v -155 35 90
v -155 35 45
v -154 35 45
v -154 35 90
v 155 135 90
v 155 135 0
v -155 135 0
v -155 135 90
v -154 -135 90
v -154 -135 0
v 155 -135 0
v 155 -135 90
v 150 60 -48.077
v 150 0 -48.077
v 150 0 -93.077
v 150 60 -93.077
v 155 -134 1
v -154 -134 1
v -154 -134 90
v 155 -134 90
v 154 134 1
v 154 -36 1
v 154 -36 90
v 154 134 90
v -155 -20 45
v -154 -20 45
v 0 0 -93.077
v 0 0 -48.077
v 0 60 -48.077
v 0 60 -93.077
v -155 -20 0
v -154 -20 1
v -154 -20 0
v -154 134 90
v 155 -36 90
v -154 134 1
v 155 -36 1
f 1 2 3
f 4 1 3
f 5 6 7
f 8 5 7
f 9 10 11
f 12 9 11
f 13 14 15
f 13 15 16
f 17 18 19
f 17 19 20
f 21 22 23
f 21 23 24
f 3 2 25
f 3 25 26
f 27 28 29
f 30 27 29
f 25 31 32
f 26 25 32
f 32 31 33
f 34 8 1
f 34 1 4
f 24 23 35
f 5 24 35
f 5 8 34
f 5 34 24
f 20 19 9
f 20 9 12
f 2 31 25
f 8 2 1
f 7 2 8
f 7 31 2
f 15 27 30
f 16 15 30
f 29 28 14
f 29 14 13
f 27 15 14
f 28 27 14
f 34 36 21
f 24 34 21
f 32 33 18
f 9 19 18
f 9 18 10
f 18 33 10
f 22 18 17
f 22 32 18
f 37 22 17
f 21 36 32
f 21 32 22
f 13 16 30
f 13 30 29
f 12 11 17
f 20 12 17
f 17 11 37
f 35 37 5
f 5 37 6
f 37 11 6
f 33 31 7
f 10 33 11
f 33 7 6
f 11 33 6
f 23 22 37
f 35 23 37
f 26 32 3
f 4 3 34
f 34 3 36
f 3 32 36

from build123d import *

# Parameters (mm, degrees)
F1_DEPTH = 1
F0_W     = 1
F0_H     = 99
F0_H_2   = 170
F0_W_2   = 309
F0_H_3   = 1
F2_DEPTH = 90
F0_H_4   = 55
F3_DEPTH = 45
F4_W     = 60
F4_H     = 45
F5_DEPTH = 150


with BuildPart() as f1:
    # F0 (on Top) → F1 (new body)
    with BuildSketch(Plane.XY):
        Polygon((-154, -134), (155, -134), (155, -36), (154, -36), (154, 134), (-154, 134), (-154, 35), (-154, -20), (-154, -132.63689), align=None)
    extrude(amount=F1_DEPTH)

    # F0 (on Top) → F2 (join)
    with BuildSketch(Plane.XY):
        Polygon((154, 134), (155, 134), (155, 135), (-155, 135), (-155, 134), (-154, 134), align=None)
        with Locations((-154.5, 84.5)):
            Rectangle(F0_W, F0_H)
        with Locations((154.5, 49)):
            Rectangle(F0_W, F0_H_2)
        with Locations((0.5, -134.5)):
            Rectangle(F0_W_2, F0_H_3)
    extrude(amount=F2_DEPTH)

    # F0 (on Top) → F3 (join)
    with BuildSketch(Plane.XY):
        with Locations((-154.5, 7.5)):
            Rectangle(F0_W, F0_H_4)
    extrude(amount=F3_DEPTH)


with BuildPart() as f5:
    # F4 (on Right) → F5 (new body)
    with BuildSketch(Plane.YZ):
        with Locations((30, -70.577434)):
            Rectangle(F4_W, F4_H)
    extrude(amount=F5_DEPTH)


solid = Compound([f1.part, f5.part])
